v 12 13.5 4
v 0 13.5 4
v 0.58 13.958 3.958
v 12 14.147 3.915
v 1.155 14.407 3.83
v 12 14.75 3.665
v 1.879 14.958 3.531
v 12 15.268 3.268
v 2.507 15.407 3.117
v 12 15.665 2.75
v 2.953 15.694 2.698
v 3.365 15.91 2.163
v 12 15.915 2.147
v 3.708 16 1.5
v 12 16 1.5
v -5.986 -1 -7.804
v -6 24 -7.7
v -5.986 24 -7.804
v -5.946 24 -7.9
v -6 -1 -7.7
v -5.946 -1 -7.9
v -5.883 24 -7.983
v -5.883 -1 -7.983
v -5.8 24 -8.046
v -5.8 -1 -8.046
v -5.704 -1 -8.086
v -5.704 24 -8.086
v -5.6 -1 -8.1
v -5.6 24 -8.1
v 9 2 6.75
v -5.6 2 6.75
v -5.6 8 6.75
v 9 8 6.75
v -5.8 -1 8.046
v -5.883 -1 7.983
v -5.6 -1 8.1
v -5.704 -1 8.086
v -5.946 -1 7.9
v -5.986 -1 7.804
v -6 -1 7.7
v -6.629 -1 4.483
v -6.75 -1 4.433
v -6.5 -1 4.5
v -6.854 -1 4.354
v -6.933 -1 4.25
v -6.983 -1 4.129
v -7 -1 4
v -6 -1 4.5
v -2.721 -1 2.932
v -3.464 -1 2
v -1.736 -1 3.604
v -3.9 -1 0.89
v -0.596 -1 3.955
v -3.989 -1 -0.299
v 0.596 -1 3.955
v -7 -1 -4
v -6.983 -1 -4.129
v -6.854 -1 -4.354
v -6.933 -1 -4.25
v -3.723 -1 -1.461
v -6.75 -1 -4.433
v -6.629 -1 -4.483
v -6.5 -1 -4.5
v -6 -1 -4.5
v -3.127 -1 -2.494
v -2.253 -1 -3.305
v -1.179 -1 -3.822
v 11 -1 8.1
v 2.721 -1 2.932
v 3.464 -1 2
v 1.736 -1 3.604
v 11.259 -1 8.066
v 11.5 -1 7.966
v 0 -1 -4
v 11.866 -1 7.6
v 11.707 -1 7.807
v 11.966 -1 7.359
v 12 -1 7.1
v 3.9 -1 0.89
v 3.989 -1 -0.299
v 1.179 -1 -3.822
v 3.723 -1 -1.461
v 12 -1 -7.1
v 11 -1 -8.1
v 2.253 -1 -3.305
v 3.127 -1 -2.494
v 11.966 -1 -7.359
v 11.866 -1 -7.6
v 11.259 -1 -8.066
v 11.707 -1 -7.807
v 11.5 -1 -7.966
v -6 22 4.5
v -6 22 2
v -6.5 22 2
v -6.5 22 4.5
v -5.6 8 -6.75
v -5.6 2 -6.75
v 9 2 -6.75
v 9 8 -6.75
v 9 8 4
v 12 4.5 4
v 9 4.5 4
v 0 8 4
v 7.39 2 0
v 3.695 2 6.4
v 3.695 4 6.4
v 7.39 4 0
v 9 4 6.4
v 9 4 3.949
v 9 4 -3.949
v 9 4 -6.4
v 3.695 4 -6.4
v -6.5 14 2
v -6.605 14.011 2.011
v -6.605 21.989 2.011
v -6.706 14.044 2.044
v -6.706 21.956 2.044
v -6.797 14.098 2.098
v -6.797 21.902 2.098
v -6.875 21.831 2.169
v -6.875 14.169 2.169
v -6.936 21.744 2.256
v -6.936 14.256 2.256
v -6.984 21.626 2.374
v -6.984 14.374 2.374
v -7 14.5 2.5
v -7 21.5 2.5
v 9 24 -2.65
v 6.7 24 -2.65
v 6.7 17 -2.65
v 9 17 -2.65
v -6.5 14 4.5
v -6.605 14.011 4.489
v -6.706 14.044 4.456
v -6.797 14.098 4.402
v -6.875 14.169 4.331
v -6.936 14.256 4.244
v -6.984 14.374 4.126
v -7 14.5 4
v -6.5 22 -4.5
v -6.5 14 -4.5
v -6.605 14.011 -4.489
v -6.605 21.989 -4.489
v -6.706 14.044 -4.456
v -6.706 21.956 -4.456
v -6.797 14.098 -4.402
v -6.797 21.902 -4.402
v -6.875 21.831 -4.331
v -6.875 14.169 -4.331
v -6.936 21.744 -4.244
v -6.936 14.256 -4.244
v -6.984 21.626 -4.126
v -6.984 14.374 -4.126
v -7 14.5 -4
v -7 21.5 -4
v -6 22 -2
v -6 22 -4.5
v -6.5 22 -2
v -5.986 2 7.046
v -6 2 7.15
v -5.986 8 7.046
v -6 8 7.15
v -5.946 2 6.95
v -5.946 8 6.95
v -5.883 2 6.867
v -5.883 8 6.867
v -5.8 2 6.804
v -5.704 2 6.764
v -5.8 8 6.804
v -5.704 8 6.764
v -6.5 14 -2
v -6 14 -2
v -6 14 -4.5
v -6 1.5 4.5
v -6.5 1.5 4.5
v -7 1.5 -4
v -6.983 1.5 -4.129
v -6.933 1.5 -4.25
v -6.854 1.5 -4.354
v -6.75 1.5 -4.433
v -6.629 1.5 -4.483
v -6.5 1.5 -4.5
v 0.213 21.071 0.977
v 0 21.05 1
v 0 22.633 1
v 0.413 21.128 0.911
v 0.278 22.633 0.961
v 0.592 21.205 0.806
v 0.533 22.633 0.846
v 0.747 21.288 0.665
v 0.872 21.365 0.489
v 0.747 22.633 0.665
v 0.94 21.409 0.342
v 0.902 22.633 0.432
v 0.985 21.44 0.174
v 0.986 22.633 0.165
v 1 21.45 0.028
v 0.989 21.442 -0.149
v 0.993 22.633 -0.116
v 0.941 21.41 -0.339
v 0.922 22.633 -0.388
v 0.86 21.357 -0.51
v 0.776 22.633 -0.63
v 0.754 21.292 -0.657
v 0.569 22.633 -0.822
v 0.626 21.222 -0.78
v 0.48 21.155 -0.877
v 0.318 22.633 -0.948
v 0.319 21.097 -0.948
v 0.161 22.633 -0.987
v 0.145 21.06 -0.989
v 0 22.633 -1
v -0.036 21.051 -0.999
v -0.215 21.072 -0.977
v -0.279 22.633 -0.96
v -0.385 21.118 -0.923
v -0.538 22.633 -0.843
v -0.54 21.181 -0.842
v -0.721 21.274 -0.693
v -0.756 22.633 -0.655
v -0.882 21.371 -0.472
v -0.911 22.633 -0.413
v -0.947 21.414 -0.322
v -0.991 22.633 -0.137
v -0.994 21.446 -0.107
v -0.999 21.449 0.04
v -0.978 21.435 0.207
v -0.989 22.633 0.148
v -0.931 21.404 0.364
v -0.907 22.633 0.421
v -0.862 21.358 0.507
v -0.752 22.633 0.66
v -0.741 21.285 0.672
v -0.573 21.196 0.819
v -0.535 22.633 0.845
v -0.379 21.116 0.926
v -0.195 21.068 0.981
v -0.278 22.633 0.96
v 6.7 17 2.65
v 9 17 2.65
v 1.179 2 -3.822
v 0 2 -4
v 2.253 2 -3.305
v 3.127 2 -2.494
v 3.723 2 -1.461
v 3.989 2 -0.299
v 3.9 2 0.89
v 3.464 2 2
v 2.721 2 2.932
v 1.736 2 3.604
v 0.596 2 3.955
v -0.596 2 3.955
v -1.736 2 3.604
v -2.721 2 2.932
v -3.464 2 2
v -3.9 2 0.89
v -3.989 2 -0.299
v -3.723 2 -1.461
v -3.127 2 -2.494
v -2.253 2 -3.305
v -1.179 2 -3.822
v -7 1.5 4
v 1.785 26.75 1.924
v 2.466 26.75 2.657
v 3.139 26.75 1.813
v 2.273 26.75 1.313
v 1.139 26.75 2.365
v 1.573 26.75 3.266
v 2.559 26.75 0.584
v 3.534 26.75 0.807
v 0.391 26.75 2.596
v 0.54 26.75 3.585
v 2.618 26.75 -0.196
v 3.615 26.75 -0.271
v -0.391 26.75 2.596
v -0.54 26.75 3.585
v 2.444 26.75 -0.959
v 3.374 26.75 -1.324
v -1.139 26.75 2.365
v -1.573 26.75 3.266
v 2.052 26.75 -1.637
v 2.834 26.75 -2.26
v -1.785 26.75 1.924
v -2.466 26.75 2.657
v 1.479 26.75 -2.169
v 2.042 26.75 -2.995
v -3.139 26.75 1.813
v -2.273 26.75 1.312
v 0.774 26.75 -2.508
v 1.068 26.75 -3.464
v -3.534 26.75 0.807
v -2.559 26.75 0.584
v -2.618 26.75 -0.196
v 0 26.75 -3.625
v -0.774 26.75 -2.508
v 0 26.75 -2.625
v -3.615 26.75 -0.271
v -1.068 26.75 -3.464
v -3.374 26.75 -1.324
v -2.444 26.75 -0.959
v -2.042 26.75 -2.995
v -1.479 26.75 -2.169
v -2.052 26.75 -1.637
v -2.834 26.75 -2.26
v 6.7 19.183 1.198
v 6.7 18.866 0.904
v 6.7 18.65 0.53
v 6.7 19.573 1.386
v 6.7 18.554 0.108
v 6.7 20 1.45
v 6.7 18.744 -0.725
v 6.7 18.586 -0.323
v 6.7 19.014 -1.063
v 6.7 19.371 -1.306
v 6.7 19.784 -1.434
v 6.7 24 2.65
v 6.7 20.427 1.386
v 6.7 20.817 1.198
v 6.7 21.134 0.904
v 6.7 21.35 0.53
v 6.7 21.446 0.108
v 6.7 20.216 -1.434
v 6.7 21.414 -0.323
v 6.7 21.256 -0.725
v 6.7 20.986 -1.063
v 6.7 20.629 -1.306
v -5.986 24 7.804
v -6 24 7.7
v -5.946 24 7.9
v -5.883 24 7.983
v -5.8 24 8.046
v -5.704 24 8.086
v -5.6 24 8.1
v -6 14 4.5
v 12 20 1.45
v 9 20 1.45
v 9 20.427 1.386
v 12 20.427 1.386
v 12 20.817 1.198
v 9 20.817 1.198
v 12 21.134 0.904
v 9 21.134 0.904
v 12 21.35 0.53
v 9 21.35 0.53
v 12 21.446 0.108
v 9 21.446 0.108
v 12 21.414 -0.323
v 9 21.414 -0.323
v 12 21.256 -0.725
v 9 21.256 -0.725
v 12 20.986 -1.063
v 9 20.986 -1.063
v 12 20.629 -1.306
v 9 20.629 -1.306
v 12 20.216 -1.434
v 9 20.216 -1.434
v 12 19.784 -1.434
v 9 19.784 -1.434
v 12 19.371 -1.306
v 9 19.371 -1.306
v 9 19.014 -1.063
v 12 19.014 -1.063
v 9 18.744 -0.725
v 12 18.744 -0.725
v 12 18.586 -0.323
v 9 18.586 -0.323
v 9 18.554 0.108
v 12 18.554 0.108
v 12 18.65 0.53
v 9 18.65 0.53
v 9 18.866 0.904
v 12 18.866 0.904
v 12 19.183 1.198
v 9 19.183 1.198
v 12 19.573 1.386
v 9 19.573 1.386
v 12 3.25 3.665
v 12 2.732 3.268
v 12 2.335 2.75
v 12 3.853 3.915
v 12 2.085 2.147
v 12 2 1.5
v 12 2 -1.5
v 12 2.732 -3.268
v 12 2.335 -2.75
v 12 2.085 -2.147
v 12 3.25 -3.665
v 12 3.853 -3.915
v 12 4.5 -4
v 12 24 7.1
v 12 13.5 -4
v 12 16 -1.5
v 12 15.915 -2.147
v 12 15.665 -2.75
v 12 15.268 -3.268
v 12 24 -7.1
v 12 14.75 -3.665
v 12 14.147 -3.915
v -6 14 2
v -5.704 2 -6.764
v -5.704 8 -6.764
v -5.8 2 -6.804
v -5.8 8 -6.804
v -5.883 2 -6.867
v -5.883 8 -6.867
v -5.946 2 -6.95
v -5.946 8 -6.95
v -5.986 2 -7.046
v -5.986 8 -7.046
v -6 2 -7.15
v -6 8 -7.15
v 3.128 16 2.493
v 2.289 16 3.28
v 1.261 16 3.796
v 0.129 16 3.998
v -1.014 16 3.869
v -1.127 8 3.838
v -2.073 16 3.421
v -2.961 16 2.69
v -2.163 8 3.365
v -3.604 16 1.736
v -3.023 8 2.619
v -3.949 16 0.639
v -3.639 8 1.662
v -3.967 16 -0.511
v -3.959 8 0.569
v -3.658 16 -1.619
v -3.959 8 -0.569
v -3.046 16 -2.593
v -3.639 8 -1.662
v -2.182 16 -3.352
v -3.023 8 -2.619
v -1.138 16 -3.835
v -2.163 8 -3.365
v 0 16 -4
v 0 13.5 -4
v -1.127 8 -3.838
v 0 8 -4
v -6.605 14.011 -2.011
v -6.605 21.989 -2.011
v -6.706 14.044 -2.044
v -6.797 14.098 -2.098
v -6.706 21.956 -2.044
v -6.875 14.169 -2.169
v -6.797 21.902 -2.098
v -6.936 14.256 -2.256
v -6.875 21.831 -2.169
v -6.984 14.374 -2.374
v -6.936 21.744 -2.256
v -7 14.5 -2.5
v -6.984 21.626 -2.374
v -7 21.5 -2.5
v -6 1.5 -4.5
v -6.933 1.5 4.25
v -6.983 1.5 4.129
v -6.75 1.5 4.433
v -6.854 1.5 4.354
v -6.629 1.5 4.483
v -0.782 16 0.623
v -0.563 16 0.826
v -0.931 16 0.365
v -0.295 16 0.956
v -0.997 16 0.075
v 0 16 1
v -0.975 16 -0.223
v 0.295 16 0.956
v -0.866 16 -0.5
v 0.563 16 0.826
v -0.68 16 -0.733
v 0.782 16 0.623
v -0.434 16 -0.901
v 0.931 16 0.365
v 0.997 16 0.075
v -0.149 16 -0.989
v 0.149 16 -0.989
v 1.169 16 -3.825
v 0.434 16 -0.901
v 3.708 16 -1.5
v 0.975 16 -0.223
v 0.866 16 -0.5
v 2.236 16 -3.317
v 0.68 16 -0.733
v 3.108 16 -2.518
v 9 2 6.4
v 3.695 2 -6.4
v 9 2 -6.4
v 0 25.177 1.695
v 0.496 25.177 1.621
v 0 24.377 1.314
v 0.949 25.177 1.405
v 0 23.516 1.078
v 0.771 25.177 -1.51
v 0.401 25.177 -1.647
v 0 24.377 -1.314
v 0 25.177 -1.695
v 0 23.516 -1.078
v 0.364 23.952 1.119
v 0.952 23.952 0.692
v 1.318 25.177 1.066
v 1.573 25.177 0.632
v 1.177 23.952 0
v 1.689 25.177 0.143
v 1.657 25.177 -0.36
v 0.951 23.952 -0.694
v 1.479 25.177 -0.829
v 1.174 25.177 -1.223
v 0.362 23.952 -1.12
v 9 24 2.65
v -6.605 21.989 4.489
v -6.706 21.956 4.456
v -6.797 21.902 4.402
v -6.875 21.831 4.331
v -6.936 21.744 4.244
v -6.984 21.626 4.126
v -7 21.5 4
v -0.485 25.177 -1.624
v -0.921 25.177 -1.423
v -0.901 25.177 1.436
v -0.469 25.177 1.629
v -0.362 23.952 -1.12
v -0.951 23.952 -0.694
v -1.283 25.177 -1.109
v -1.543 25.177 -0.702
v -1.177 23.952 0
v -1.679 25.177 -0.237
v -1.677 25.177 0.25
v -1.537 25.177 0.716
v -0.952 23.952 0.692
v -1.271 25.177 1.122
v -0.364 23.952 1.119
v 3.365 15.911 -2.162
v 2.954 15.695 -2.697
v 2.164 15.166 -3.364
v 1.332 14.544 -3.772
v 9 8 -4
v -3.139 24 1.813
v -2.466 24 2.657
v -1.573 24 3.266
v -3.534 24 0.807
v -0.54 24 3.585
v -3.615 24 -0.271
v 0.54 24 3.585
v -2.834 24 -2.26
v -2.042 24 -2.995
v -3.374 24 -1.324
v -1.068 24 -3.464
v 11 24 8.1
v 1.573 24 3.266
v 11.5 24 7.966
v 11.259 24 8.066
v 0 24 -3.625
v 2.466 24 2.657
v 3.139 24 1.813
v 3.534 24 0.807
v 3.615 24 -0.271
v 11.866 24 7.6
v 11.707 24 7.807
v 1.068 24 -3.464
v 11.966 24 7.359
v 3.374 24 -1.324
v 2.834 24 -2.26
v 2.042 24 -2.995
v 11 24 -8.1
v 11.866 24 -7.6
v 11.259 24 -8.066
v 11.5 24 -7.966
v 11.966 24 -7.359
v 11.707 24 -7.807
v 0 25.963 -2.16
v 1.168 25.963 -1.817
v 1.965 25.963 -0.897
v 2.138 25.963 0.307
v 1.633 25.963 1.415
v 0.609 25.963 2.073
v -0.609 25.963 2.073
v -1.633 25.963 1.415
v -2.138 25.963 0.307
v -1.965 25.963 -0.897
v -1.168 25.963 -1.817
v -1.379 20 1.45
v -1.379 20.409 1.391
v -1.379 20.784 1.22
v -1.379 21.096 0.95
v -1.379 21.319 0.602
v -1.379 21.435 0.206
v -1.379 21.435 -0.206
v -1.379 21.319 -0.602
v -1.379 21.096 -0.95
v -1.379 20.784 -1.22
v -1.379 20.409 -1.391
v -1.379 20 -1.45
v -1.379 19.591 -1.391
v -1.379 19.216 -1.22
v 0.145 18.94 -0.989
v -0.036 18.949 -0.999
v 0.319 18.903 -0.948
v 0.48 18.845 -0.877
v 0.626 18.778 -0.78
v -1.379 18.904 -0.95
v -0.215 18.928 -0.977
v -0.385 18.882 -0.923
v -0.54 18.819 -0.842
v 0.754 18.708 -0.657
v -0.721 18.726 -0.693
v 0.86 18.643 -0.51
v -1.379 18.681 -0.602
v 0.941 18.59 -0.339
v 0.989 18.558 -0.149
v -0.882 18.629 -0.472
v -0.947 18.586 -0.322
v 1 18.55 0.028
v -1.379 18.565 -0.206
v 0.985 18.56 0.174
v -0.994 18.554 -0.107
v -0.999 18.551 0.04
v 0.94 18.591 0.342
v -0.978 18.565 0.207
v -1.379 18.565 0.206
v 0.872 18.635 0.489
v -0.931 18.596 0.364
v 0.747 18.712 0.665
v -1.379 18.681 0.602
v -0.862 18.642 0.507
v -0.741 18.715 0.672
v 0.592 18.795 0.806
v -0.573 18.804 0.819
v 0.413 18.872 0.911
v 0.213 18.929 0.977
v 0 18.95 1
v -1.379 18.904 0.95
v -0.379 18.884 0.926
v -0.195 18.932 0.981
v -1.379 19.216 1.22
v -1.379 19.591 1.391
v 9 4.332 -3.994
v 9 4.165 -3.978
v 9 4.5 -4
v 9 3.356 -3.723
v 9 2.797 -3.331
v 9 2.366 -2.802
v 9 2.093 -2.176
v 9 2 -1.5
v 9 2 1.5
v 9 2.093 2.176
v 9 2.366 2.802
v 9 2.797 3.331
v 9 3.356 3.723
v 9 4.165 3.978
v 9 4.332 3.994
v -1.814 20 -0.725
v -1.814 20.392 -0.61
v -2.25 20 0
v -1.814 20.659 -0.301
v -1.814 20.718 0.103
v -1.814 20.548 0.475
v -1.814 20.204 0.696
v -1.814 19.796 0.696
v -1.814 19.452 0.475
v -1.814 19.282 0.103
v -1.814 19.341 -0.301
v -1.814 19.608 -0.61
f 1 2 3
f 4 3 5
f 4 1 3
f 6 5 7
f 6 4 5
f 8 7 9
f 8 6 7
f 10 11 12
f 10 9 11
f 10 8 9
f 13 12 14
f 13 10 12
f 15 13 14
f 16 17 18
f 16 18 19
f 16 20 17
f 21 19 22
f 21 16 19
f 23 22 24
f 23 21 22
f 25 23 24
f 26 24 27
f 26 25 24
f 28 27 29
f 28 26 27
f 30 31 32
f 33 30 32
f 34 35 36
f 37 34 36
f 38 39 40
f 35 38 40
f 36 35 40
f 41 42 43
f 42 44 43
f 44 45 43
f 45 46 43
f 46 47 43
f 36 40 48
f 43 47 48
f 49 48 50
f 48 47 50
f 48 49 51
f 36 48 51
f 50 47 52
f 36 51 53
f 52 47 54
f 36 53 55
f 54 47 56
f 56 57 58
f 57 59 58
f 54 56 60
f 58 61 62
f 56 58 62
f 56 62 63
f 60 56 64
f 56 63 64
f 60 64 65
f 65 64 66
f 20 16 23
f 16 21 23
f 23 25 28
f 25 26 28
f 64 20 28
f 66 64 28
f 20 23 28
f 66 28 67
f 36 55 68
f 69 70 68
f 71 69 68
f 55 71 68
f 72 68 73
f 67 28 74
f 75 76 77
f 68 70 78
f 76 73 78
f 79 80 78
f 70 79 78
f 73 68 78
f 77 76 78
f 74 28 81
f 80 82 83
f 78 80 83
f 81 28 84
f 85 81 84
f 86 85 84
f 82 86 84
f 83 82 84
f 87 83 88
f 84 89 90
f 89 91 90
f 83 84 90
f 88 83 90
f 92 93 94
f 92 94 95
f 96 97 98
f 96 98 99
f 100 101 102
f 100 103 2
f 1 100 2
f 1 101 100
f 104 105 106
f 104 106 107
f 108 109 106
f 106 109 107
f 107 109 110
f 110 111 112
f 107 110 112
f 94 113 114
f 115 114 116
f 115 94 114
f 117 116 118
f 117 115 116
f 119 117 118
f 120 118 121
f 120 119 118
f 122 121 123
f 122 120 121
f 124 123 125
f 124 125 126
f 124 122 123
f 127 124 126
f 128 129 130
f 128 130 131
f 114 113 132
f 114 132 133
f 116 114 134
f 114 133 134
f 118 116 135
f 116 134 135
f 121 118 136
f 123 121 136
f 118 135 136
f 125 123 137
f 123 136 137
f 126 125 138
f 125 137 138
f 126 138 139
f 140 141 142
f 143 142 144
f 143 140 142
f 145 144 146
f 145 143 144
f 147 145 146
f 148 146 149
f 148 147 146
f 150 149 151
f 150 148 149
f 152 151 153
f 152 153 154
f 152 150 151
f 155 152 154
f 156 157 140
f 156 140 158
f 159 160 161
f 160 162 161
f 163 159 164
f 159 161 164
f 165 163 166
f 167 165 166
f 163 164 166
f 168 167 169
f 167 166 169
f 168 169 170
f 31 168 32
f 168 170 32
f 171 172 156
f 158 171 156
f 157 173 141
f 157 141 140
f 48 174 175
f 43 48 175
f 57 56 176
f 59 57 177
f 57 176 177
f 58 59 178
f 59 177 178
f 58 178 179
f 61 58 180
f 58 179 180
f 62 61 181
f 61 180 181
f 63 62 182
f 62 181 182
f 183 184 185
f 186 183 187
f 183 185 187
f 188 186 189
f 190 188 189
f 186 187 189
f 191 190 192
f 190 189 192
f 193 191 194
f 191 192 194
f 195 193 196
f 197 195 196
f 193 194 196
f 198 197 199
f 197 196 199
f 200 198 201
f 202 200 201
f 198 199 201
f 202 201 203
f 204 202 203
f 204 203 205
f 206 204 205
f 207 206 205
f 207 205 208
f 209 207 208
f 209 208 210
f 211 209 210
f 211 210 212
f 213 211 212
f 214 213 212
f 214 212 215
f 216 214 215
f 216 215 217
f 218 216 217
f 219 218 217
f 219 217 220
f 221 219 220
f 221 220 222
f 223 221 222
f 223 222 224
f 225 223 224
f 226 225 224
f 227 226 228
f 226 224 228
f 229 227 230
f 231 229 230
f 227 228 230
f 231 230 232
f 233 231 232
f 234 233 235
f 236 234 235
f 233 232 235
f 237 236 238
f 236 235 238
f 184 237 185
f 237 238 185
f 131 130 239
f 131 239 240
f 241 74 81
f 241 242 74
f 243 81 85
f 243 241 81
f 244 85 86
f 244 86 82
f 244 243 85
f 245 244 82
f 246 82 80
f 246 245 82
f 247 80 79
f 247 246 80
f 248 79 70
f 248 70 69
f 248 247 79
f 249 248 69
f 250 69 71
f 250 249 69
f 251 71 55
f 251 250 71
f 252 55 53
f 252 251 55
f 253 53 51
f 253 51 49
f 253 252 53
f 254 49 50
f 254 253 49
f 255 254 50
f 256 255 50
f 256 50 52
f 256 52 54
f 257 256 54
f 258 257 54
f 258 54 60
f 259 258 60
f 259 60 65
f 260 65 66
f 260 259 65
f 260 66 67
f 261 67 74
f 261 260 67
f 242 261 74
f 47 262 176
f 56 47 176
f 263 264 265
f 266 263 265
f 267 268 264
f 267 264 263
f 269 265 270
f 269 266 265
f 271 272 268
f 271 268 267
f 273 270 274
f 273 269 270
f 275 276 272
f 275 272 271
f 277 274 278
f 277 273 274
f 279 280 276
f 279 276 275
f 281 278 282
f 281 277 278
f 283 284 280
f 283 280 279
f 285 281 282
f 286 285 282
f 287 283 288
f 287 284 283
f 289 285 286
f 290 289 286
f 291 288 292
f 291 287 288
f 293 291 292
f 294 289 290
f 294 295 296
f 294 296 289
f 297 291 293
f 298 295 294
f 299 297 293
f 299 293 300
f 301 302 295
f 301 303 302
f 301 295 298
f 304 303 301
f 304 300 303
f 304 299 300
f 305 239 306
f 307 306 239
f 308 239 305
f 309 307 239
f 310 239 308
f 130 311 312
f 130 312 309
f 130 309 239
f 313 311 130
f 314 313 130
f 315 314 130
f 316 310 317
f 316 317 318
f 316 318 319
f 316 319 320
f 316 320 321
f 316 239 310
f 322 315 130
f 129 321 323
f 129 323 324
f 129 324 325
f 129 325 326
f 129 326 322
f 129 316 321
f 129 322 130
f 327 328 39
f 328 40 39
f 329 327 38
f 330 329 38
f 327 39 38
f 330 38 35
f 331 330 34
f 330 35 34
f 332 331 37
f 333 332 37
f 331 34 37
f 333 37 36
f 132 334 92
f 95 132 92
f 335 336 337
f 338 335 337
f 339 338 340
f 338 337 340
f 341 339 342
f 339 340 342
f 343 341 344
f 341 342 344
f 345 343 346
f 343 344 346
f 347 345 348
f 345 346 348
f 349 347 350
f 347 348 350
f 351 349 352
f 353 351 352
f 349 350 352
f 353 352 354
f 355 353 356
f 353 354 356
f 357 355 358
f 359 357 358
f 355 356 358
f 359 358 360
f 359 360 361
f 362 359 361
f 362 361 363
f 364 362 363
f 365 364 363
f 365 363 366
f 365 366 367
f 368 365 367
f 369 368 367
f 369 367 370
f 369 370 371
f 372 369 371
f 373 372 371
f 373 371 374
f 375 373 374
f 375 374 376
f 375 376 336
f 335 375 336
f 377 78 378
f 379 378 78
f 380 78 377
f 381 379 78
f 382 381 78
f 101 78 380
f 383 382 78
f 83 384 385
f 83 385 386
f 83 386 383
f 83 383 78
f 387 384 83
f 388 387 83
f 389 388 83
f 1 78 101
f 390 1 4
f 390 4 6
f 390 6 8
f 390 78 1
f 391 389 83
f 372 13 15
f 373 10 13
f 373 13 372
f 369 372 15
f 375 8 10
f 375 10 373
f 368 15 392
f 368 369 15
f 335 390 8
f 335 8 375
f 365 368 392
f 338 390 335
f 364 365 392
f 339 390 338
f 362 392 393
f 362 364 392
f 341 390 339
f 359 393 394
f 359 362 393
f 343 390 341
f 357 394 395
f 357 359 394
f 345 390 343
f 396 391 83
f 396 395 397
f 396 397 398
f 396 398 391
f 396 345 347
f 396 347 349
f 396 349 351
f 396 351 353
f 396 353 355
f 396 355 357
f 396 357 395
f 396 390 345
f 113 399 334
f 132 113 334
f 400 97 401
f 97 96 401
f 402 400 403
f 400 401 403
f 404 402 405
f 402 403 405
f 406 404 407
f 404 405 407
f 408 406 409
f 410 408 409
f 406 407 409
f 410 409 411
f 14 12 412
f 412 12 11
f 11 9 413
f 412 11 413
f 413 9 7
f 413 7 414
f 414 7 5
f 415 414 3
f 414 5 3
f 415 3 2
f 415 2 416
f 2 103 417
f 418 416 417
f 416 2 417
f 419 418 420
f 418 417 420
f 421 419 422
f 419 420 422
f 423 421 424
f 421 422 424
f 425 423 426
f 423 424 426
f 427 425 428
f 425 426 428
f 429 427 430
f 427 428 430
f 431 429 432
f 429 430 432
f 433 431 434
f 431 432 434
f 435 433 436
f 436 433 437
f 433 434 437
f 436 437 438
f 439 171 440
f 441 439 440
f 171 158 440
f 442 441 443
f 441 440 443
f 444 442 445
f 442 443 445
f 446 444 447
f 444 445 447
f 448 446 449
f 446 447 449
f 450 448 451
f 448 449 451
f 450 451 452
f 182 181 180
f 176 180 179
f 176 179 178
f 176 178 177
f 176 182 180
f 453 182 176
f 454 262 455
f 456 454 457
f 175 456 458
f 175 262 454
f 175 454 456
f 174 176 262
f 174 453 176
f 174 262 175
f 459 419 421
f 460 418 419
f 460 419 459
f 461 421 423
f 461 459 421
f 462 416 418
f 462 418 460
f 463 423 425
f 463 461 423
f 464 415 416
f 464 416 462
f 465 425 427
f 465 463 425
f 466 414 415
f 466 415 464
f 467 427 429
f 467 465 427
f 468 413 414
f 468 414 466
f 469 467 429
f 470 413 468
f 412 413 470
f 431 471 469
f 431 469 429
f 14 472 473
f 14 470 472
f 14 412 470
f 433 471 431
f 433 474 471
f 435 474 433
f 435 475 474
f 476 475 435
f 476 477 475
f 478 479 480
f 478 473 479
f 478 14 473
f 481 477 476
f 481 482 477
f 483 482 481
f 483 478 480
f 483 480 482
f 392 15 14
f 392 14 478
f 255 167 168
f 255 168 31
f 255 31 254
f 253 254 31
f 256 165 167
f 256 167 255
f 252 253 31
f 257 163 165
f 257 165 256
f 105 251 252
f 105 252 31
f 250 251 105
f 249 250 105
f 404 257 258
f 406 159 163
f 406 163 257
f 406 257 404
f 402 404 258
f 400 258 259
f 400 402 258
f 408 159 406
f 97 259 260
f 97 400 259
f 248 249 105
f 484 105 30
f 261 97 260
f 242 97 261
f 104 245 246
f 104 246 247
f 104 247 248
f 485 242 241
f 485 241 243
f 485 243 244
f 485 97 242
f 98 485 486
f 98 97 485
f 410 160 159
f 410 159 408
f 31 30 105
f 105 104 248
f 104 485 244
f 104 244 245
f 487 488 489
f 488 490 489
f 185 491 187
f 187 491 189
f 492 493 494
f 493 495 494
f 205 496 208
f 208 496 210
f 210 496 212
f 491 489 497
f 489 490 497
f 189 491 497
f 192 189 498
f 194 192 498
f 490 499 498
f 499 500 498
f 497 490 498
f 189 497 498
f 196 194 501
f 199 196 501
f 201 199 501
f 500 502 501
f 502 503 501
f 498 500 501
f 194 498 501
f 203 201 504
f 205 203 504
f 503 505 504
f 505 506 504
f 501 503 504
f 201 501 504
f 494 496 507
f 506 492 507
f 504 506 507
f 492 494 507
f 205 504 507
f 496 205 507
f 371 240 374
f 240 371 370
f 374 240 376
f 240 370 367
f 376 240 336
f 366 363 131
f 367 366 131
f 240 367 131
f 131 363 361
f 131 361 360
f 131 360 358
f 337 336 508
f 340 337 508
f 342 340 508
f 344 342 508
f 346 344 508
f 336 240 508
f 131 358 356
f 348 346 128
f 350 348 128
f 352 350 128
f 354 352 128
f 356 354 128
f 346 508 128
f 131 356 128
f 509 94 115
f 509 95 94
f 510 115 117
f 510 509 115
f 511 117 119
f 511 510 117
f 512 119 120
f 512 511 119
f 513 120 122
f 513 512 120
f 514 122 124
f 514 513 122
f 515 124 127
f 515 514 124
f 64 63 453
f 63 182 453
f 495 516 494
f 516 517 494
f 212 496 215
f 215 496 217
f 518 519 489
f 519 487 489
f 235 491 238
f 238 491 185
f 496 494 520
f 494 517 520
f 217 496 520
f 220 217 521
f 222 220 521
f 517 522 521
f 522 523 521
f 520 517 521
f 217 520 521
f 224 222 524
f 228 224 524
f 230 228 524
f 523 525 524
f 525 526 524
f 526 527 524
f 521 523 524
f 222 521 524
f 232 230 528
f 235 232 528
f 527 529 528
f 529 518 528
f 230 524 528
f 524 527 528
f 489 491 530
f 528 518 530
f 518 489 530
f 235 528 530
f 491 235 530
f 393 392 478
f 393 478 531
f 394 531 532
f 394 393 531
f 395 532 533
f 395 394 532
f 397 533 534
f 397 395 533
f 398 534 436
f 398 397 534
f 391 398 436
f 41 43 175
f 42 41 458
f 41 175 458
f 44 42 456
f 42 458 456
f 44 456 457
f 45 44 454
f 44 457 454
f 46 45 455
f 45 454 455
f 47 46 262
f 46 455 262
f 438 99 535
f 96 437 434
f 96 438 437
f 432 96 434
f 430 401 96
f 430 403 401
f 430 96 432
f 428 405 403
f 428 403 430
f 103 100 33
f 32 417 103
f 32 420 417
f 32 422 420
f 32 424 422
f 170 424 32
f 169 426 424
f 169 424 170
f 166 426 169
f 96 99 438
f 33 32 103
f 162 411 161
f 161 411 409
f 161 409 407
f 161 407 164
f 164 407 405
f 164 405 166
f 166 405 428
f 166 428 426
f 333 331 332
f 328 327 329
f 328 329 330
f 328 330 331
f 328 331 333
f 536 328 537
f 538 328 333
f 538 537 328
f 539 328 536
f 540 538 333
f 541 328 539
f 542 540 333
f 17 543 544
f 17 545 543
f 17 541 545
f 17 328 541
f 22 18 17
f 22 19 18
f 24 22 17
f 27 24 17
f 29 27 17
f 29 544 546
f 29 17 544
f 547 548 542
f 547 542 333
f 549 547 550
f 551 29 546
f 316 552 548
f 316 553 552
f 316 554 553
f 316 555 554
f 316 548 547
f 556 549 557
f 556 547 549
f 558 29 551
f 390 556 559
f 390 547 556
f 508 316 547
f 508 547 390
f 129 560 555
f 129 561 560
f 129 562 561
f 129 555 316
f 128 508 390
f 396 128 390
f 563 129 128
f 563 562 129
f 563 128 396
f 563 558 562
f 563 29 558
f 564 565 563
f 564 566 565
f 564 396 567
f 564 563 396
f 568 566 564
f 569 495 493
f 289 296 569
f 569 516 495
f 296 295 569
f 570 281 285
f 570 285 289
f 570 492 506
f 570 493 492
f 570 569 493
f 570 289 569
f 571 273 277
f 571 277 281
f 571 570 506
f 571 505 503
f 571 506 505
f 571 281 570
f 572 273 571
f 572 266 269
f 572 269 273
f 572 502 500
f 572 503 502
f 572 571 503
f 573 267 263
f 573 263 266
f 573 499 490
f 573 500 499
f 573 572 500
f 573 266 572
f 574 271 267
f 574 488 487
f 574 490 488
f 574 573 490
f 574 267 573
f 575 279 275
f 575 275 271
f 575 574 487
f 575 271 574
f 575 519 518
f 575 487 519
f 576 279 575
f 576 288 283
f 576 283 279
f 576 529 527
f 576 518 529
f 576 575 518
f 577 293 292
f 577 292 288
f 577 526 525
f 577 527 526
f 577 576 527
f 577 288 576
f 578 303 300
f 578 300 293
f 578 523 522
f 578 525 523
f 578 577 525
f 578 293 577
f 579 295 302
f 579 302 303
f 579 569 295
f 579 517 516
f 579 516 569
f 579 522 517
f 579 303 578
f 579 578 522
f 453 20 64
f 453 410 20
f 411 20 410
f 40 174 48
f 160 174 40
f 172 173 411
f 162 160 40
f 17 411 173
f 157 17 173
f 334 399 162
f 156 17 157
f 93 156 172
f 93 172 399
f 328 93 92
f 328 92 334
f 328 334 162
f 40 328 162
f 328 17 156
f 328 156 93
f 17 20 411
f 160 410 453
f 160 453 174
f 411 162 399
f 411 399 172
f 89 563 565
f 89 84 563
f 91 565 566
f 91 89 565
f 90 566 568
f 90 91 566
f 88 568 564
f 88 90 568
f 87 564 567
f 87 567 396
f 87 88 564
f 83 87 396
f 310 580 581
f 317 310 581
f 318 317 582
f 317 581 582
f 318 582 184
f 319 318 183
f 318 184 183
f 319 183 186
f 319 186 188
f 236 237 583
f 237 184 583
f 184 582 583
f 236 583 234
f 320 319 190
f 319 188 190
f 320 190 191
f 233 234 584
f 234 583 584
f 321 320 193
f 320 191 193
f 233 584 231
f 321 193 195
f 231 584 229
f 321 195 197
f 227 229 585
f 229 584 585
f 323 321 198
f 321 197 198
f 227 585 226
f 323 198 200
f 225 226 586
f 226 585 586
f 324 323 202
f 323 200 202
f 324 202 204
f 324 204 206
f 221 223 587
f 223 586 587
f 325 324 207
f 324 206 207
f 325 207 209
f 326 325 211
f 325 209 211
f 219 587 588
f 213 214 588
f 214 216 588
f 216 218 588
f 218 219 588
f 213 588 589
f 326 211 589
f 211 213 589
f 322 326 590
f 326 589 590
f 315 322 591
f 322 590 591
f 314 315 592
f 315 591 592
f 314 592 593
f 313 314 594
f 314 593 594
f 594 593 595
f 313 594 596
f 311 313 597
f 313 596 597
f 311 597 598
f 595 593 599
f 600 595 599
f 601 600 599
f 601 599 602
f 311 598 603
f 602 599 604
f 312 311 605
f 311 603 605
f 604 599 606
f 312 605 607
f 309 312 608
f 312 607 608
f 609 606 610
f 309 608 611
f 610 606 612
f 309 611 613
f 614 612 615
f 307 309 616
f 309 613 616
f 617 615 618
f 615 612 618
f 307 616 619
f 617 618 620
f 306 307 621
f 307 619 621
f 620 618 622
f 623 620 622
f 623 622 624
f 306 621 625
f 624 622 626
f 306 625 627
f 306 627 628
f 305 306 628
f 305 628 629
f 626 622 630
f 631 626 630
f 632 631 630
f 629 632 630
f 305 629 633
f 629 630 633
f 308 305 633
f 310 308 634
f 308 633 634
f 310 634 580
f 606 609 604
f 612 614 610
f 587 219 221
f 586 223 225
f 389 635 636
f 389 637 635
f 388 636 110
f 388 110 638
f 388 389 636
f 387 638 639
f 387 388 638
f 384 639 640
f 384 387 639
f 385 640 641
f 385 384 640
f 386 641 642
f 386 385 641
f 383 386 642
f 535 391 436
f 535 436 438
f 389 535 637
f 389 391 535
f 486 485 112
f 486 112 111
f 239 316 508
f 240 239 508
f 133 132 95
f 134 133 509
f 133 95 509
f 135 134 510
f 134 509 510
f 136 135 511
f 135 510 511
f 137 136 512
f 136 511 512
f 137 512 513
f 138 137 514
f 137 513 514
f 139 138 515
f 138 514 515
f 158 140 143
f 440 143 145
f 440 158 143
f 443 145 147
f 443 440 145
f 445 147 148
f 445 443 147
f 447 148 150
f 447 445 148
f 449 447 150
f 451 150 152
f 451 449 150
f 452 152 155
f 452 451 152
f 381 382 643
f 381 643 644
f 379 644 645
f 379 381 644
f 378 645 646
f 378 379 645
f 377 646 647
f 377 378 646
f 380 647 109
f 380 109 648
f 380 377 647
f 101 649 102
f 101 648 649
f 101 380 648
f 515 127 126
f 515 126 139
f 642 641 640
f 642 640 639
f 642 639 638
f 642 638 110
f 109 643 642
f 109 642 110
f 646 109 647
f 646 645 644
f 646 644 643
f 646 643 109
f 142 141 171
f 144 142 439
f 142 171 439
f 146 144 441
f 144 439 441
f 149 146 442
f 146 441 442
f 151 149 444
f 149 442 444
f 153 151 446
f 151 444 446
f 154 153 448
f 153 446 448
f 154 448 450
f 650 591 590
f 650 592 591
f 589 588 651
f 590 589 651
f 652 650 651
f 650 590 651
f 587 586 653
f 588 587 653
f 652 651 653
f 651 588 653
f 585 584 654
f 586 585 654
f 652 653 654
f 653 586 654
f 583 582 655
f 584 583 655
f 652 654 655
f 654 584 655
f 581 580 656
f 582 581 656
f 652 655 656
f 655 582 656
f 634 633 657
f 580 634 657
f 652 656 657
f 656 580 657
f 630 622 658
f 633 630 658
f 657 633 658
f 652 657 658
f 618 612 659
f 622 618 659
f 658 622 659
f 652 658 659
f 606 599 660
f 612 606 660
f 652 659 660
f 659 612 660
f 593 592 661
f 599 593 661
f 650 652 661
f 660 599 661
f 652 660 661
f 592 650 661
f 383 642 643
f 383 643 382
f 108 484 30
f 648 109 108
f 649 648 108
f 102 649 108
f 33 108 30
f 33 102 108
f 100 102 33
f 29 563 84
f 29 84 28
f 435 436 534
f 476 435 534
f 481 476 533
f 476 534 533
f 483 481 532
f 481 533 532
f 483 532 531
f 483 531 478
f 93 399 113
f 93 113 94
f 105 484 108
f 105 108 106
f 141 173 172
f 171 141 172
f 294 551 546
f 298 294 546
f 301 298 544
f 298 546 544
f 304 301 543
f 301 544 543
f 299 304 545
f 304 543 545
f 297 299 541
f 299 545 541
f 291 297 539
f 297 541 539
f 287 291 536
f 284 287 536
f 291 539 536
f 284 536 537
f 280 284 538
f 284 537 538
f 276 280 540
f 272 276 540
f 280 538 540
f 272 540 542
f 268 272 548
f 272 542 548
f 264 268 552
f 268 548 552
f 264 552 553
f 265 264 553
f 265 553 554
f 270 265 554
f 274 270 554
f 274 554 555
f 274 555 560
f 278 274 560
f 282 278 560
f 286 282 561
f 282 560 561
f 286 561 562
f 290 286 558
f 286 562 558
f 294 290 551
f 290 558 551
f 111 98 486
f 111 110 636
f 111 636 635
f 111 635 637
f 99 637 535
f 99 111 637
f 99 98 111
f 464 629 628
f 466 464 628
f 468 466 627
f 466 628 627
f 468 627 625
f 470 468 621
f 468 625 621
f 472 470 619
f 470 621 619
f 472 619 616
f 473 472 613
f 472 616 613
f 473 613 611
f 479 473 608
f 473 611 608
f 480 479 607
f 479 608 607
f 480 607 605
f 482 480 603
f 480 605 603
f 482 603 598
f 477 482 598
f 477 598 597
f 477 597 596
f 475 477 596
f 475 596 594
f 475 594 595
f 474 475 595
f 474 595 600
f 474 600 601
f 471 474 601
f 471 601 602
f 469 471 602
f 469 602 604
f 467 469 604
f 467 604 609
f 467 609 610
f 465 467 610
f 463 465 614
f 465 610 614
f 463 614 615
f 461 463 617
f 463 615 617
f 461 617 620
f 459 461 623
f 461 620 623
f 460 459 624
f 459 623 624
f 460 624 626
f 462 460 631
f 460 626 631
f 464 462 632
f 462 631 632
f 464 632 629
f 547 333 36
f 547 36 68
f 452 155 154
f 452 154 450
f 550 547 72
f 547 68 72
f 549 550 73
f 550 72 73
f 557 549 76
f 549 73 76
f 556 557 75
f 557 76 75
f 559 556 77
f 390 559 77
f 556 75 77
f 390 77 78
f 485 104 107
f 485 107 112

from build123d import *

# Parameters (mm, degrees)
SKETCH1_W                  = 12
SKETCH1_H                  = 13
BOSS_EXTRUDE1_DEPTH        = 19
SKETCH2_R                  = 4
CUT_EXTRUDE1_DEPTH         = 16
CUT_EXTRUDE2_START         = -2
SKETCH3_W                  = 12
SKETCH3_H                  = 13
CUT_EXTRUDE2_DEPTH         = 6
SKETCH5_W                  = 12
SKETCH5_H                  = 13
BOSS_EXTRUDE2_DEPTH        = 5
FILLET1_R                  = 2
FILLET4_R                  = 2
SKETCH21_W                 = 2.5
SKETCH21_H                 = 8
SKETCH21_W_2               = 9
SKETCH21_H_2               = 1.5
BOSS_EXTRUDE4_DEPTH        = 1
FILLET3_R                  = 0.5
FILLET7_R                  = 0.5
FILLET5_R                  = 0.5
SKETCH23_R                 = 4
BOSS_EXTRUDE5_DEPTH        = 1
BOSS_EXTRUDE6_DEPTH        = 13
BOSS_EXTRUDE7_DEPTH        = 25
SKETCH11_W                 = 2.3
SKETCH11_H                 = 5.3
CUT_EXTRUDE4_DEPTH         = 7
SKETCH34_W                 = 13.5
SKETCH34_H                 = 6
CUT_EXTRUDE5_DEPTH         = 15
M2_5_CLEARANCE_HOLE1_D     = 2.9
M2_5_CLEARANCE_HOLE1_DEPTH = 13.378752102
M2_5_CLEARANCE_HOLE1_TIP   = 0.871247898
FILLET8_R                  = 0.4
SKETCH31_R                 = 3.625
SKETCH31_R_2               = 2.625
BOSS_EXTRUDE8_DEPTH        = 2.75
FILLET9_R                  = 1
SKETCH9_R                  = 1
CUT_EXTRUDE6_DEPTH         = 29.889617512
CUT_EXTRUDE8_DEPTH         = 12
FILLET10_R                 = 5
BOSS_EXTRUDE9_DEPTH        = 2


with BuildPart() as part:
    # Sketch1 → Boss-Extrude1 (new body)
    with BuildSketch(Plane(origin=(0, 0, 0), x_dir=(1, 0, 0), z_dir=(0, 1, 0))):
        Rectangle(SKETCH1_W, SKETCH1_H)
    extrude(amount=BOSS_EXTRUDE1_DEPTH)

    # Sketch2 → Cut-Extrude1 (cut)
    with BuildSketch(Plane.XZ):
        with Locations(Location((0, 0, 0), (0, 0, 270))):
            Circle(SKETCH2_R)
    extrude(amount=-CUT_EXTRUDE1_DEPTH, mode=Mode.SUBTRACT)

    # Sketch3 → Cut-Extrude2 (cut)
    with BuildSketch(Plane.XZ.offset(CUT_EXTRUDE2_START)):
        Rectangle(SKETCH3_W, SKETCH3_H)
    extrude(amount=-CUT_EXTRUDE2_DEPTH, mode=Mode.SUBTRACT)


with BuildPart() as cut_extrude2_piece_1:
    # of the separate pieces the step leaves, piece 1, a body of its own (cut_extrude2_pieces)
    add(part.part.solids().sort_by_distance((-6, 8, 6.5))[0])

    # Sketch5 → Boss-Extrude2 (add)
    with BuildSketch(Plane(origin=(0, 19, 0), x_dir=(1, 0, 0), z_dir=(0, 1, 0))):
        Rectangle(SKETCH5_W, SKETCH5_H)
    extrude(amount=BOSS_EXTRUDE2_DEPTH)

    # Fillet1
    fillet1_edges = [cut_extrude2_piece_1.edges().sort_by_distance(p)[0] for p in [
        (-6, 16, -6.5),
        (-6, 16, 6.5),
    ]]
    fillet(fillet1_edges, radius=FILLET1_R)



with BuildPart() as cut_extrude2_piece_2:
    # of the separate pieces the step leaves, piece 2, a body of its own (cut_extrude2_pieces)
    add(part.part.solids().sort_by_distance((-6, 0, 6.5))[0])

    # Fillet4
    fillet4_edges = [cut_extrude2_piece_2.edges().sort_by_distance(p)[0] for p in [
        (-6, 1, 6.5),
        (-6, 1, -6.5),
    ]]
    fillet(fillet4_edges, radius=FILLET4_R)

    # Sketch21 → Boss-Extrude4 (add)
    with BuildSketch(Plane.ZY.offset(6)):
        with Locations((-3.25, 18)):
            Rectangle(SKETCH21_W, SKETCH21_H)
        with Locations((3.25, 18)):
            Rectangle(SKETCH21_W, SKETCH21_H)
        with Locations((0, 0.75)):
            Rectangle(SKETCH21_W_2, SKETCH21_H_2)
    extrude(amount=BOSS_EXTRUDE4_DEPTH)


with BuildPart() as boss_extrude4_piece_1:
    # of the separate pieces the step leaves, piece 1, a body of its own (boss_extrude4_pieces)
    add(cut_extrude2_piece_2.part.solids().sort_by_distance((-4, 0, 6.5))[0])

    # Fillet5
    fillet5_edges = [boss_extrude4_piece_1.edges().sort_by_distance(p)[0] for p in [
        (-7, 0.75, -4.5),
        (-7, 0.75, 4.5),
    ]]
    fillet(fillet5_edges, radius=FILLET5_R)

    # Sketch23 → Boss-Extrude5 (add)
    with BuildSketch(Plane.XZ):
        with BuildLine():
            Line((-7, 4), (-7, -4))
            ThreePointArc((-7, -4), (-6.853553391, -4.353553391), (-6.5, -4.5))
            Line((-6.5, -4.5), (-6, -4.5))
            ThreePointArc((-6, -4.5), (-5.414213562, -5.914213562), (-4, -6.5))
            Line((-4, -6.5), (6, -6.5))
            Line((6, -6.5), (6, 6.5))
            Line((6, 6.5), (-4, 6.5))
            ThreePointArc((-4, 6.5), (-5.414213562, 5.914213562), (-6, 4.5))
            Line((-6, 4.5), (-6.5, 4.5))
            ThreePointArc((-6.5, 4.5), (-6.853553391, 4.353553391), (-7, 4))
        make_face()
        with Locations(Location((0, 0, 0), (0, 0, 270))):
            Circle(SKETCH23_R, mode=Mode.SUBTRACT)
    extrude(amount=BOSS_EXTRUDE5_DEPTH)


with BuildPart() as boss_extrude4_piece_2:
    # of the separate pieces the step leaves, piece 2, a body of its own (boss_extrude4_pieces)
    add(cut_extrude2_piece_2.part.solids().sort_by_distance((-6, 22, -4.5))[0])

    # Fillet7
    fillet7_edges = [boss_extrude4_piece_2.edges().sort_by_distance(p)[0] for p in [
        (-7, 18, -2),
        (-7, 22, -3.25),
        (-7, 18, -4.5),
        (-7, 14, -3.25),
    ]]
    fillet(fillet7_edges, radius=FILLET7_R)


with BuildPart() as boss_extrude4_piece_3:
    # of the separate pieces the step leaves, piece 3, a body of its own (boss_extrude4_pieces)
    add(cut_extrude2_piece_2.part.solids().sort_by_distance((-6, 22, 2))[0])

    # Fillet3
    fillet3_edges = [boss_extrude4_piece_3.edges().sort_by_distance(p)[0] for p in [
        (-7, 22, 3.25),
        (-7, 18, 2),
        (-7, 14, 3.25),
        (-7, 18, 4.5),
    ]]
    fillet(fillet3_edges, radius=FILLET3_R)


with BuildPart() as cut_extrude2_piece_1_1:
    add(cut_extrude2_piece_1.part)

    add(boss_extrude4_piece_1.part)  # Boss-Extrude6 merges Boss-Extrude4 piece 1
    # Sketch26 → Boss-Extrude6 (add, through all)
    with BuildSketch(Plane(origin=(0, 0, -6.5), x_dir=(-1, 0, 0), z_dir=(0, 0, -1))):
        Polygon((-6, 24), (-12, 24), (-12, -1), (-6, -1), (-6, 2), (-9, 2), (-9, 8), (-6, 8), align=None)
    extrude(amount=-BOSS_EXTRUDE6_DEPTH)


    add(boss_extrude4_piece_2.part)  # Boss-Extrude7 merges Boss-Extrude4 piece 2

    add(boss_extrude4_piece_3.part)  # Boss-Extrude7 merges Boss-Extrude4 piece 3
    # Sketch30 → Boss-Extrude7 (add, through all)
    with BuildSketch(Plane(origin=(0, 24, 0), x_dir=(1, 0, 0), z_dir=(0, 1, 0))):
        with BuildLine():
            ThreePointArc((-6, 4.5), (-5.414213562, 5.914213562), (-4, 6.5))
            Line((-4, 6.5), (12, 6.5))
            Line((12, 6.5), (12, 8.1))
            Line((12, 8.1), (-6, 8.1))
            Line((-6, 8.1), (-6, 4.5))
        make_face()
        with BuildLine():
            Line((12, -6.5), (-4, -6.5))
            ThreePointArc((-4, -6.5), (-5.414213562, -5.914213562), (-6, -4.5))
            Line((-6, -4.5), (-6, -8.1))
            Line((-6, -8.1), (12, -8.1))
            Line((12, -8.1), (12, -6.5))
        make_face()
    extrude(amount=-BOSS_EXTRUDE7_DEPTH)

    # Sketch11 → Cut-Extrude4 (cut)
    with BuildSketch(Plane(origin=(0, 24, 0), x_dir=(1, 0, 0), z_dir=(0, 1, 0))):
        with Locations((7.85, 0)):
            Rectangle(SKETCH11_W, SKETCH11_H)
    extrude(amount=-CUT_EXTRUDE4_DEPTH, mode=Mode.SUBTRACT)

    # Sketch34 → Cut-Extrude5 (cut)
    with BuildSketch(Plane.ZY.offset(6)):
        with Locations((0, 5)):
            Rectangle(SKETCH34_W, SKETCH34_H)
    extrude(amount=-CUT_EXTRUDE5_DEPTH, mode=Mode.SUBTRACT)

    # M2.5 Clearance Hole1
    with Locations(Plane(origin=(12, 0, 0), x_dir=(0, 0, -1), z_dir=(1, 0, 0))):
        with Locations((0, 20)):
            Hole(M2_5_CLEARANCE_HOLE1_D / 2, depth=M2_5_CLEARANCE_HOLE1_DEPTH)
            with Locations((0, 0, -(M2_5_CLEARANCE_HOLE1_DEPTH + M2_5_CLEARANCE_HOLE1_TIP / 2))):  # 118° drill point
                Cone(0, M2_5_CLEARANCE_HOLE1_D / 2, M2_5_CLEARANCE_HOLE1_TIP, mode=Mode.SUBTRACT)

    # Fillet8
    fillet8_edges = [cut_extrude2_piece_1_1.edges().sort_by_distance(p)[0] for p in [
        (-6, 11.5, 8.1),
        (-6, 5, 6.75),
        (-6, 5, -6.75),
        (-6, 11.5, -8.1),
    ]]
    fillet(fillet8_edges, radius=FILLET8_R)

    # Sketch31 → Boss-Extrude8 (add)
    with BuildSketch(Plane(origin=(0, 24, 0), x_dir=(1, 0, 0), z_dir=(0, 1, 0))):
        with Locations(Location((0, 0, 0), (0, 0, 90))):
            Circle(SKETCH31_R)
        with Locations(Location((0, 0, 0), (0, 0, 270))):
            Circle(SKETCH31_R_2, mode=Mode.SUBTRACT)
    extrude(amount=BOSS_EXTRUDE8_DEPTH)

    # Fillet9
    fillet9_edges = [cut_extrude2_piece_1_1.edges().sort_by_distance(p)[0] for p in [
        (12, 11.5, 8.1),
        (12, 11.5, -8.1),
    ]]
    fillet(fillet9_edges, radius=FILLET9_R)

    # Sketch9 → Cut-Extrude6 (cut, through all)
    with BuildSketch(Plane(origin=(0, 24, 0), x_dir=(1, 0, 0), z_dir=(0, 1, 0))):
        with Locations(Location((0, 0, 0), (0, 0, 270))):
            Circle(SKETCH9_R)
    extrude(amount=-CUT_EXTRUDE6_DEPTH, mode=Mode.SUBTRACT)

    # Sketch42 → Cut-Extrude8 (cut)
    with BuildSketch(Plane(origin=(12, 0, 0), x_dir=(0, 0, -1), z_dir=(1, 0, 0))):
        with BuildLine():
            Line((-1.5, 16), (1.5, 16))
            ThreePointArc((1.5, 16), (3.267766953, 15.267766953), (4, 13.5))
            Line((4, 13.5), (4, 4.5))
            ThreePointArc((4, 4.5), (3.267766953, 2.732233047), (1.5, 2))
            Line((1.5, 2), (-1.5, 2))
            ThreePointArc((-1.5, 2), (-3.267766953, 2.732233047), (-4, 4.5))
            Line((-4, 4.5), (-4, 13.5))
            ThreePointArc((-4, 13.5), (-3.267766953, 15.267766953), (-1.5, 16))
        make_face()
    extrude(amount=-CUT_EXTRUDE8_DEPTH, mode=Mode.SUBTRACT)

    # Sketch43 → Revolve1 (revolve)
    with BuildSketch(Plane.XY, mode=Mode.PRIVATE) as revolve1_sk:
        Polygon((1, 24), (2.625, 26.75), (2.625, 24), align=None)
    revolve(revolve1_sk.sketch.rotate(Axis((0, 28.9875, 0), (0, -1, 0)), 270), axis=Axis((0, 28.9875, 0), (0, -1, 0)))

    # Fillet10
    fillet10_edges = [cut_extrude2_piece_1_1.edges().sort_by_distance(p)[0] for p in [
        (1, 24, 0),
    ]]
    fillet(fillet10_edges, radius=FILLET10_R)

    # Sketch45 → Boss-Extrude9 (add)
    with BuildSketch(Plane(origin=(0, 2, 0), x_dir=(1, 0, 0), z_dir=(0, 1, 0))):
        Polygon((3.695041723, -6.4), (7.390083446, 0), (3.695041723, 6.4), (9, 6.4), (9, -6.4), align=None)
    extrude(amount=BOSS_EXTRUDE9_DEPTH)


solid = cut_extrude2_piece_1_1.part
